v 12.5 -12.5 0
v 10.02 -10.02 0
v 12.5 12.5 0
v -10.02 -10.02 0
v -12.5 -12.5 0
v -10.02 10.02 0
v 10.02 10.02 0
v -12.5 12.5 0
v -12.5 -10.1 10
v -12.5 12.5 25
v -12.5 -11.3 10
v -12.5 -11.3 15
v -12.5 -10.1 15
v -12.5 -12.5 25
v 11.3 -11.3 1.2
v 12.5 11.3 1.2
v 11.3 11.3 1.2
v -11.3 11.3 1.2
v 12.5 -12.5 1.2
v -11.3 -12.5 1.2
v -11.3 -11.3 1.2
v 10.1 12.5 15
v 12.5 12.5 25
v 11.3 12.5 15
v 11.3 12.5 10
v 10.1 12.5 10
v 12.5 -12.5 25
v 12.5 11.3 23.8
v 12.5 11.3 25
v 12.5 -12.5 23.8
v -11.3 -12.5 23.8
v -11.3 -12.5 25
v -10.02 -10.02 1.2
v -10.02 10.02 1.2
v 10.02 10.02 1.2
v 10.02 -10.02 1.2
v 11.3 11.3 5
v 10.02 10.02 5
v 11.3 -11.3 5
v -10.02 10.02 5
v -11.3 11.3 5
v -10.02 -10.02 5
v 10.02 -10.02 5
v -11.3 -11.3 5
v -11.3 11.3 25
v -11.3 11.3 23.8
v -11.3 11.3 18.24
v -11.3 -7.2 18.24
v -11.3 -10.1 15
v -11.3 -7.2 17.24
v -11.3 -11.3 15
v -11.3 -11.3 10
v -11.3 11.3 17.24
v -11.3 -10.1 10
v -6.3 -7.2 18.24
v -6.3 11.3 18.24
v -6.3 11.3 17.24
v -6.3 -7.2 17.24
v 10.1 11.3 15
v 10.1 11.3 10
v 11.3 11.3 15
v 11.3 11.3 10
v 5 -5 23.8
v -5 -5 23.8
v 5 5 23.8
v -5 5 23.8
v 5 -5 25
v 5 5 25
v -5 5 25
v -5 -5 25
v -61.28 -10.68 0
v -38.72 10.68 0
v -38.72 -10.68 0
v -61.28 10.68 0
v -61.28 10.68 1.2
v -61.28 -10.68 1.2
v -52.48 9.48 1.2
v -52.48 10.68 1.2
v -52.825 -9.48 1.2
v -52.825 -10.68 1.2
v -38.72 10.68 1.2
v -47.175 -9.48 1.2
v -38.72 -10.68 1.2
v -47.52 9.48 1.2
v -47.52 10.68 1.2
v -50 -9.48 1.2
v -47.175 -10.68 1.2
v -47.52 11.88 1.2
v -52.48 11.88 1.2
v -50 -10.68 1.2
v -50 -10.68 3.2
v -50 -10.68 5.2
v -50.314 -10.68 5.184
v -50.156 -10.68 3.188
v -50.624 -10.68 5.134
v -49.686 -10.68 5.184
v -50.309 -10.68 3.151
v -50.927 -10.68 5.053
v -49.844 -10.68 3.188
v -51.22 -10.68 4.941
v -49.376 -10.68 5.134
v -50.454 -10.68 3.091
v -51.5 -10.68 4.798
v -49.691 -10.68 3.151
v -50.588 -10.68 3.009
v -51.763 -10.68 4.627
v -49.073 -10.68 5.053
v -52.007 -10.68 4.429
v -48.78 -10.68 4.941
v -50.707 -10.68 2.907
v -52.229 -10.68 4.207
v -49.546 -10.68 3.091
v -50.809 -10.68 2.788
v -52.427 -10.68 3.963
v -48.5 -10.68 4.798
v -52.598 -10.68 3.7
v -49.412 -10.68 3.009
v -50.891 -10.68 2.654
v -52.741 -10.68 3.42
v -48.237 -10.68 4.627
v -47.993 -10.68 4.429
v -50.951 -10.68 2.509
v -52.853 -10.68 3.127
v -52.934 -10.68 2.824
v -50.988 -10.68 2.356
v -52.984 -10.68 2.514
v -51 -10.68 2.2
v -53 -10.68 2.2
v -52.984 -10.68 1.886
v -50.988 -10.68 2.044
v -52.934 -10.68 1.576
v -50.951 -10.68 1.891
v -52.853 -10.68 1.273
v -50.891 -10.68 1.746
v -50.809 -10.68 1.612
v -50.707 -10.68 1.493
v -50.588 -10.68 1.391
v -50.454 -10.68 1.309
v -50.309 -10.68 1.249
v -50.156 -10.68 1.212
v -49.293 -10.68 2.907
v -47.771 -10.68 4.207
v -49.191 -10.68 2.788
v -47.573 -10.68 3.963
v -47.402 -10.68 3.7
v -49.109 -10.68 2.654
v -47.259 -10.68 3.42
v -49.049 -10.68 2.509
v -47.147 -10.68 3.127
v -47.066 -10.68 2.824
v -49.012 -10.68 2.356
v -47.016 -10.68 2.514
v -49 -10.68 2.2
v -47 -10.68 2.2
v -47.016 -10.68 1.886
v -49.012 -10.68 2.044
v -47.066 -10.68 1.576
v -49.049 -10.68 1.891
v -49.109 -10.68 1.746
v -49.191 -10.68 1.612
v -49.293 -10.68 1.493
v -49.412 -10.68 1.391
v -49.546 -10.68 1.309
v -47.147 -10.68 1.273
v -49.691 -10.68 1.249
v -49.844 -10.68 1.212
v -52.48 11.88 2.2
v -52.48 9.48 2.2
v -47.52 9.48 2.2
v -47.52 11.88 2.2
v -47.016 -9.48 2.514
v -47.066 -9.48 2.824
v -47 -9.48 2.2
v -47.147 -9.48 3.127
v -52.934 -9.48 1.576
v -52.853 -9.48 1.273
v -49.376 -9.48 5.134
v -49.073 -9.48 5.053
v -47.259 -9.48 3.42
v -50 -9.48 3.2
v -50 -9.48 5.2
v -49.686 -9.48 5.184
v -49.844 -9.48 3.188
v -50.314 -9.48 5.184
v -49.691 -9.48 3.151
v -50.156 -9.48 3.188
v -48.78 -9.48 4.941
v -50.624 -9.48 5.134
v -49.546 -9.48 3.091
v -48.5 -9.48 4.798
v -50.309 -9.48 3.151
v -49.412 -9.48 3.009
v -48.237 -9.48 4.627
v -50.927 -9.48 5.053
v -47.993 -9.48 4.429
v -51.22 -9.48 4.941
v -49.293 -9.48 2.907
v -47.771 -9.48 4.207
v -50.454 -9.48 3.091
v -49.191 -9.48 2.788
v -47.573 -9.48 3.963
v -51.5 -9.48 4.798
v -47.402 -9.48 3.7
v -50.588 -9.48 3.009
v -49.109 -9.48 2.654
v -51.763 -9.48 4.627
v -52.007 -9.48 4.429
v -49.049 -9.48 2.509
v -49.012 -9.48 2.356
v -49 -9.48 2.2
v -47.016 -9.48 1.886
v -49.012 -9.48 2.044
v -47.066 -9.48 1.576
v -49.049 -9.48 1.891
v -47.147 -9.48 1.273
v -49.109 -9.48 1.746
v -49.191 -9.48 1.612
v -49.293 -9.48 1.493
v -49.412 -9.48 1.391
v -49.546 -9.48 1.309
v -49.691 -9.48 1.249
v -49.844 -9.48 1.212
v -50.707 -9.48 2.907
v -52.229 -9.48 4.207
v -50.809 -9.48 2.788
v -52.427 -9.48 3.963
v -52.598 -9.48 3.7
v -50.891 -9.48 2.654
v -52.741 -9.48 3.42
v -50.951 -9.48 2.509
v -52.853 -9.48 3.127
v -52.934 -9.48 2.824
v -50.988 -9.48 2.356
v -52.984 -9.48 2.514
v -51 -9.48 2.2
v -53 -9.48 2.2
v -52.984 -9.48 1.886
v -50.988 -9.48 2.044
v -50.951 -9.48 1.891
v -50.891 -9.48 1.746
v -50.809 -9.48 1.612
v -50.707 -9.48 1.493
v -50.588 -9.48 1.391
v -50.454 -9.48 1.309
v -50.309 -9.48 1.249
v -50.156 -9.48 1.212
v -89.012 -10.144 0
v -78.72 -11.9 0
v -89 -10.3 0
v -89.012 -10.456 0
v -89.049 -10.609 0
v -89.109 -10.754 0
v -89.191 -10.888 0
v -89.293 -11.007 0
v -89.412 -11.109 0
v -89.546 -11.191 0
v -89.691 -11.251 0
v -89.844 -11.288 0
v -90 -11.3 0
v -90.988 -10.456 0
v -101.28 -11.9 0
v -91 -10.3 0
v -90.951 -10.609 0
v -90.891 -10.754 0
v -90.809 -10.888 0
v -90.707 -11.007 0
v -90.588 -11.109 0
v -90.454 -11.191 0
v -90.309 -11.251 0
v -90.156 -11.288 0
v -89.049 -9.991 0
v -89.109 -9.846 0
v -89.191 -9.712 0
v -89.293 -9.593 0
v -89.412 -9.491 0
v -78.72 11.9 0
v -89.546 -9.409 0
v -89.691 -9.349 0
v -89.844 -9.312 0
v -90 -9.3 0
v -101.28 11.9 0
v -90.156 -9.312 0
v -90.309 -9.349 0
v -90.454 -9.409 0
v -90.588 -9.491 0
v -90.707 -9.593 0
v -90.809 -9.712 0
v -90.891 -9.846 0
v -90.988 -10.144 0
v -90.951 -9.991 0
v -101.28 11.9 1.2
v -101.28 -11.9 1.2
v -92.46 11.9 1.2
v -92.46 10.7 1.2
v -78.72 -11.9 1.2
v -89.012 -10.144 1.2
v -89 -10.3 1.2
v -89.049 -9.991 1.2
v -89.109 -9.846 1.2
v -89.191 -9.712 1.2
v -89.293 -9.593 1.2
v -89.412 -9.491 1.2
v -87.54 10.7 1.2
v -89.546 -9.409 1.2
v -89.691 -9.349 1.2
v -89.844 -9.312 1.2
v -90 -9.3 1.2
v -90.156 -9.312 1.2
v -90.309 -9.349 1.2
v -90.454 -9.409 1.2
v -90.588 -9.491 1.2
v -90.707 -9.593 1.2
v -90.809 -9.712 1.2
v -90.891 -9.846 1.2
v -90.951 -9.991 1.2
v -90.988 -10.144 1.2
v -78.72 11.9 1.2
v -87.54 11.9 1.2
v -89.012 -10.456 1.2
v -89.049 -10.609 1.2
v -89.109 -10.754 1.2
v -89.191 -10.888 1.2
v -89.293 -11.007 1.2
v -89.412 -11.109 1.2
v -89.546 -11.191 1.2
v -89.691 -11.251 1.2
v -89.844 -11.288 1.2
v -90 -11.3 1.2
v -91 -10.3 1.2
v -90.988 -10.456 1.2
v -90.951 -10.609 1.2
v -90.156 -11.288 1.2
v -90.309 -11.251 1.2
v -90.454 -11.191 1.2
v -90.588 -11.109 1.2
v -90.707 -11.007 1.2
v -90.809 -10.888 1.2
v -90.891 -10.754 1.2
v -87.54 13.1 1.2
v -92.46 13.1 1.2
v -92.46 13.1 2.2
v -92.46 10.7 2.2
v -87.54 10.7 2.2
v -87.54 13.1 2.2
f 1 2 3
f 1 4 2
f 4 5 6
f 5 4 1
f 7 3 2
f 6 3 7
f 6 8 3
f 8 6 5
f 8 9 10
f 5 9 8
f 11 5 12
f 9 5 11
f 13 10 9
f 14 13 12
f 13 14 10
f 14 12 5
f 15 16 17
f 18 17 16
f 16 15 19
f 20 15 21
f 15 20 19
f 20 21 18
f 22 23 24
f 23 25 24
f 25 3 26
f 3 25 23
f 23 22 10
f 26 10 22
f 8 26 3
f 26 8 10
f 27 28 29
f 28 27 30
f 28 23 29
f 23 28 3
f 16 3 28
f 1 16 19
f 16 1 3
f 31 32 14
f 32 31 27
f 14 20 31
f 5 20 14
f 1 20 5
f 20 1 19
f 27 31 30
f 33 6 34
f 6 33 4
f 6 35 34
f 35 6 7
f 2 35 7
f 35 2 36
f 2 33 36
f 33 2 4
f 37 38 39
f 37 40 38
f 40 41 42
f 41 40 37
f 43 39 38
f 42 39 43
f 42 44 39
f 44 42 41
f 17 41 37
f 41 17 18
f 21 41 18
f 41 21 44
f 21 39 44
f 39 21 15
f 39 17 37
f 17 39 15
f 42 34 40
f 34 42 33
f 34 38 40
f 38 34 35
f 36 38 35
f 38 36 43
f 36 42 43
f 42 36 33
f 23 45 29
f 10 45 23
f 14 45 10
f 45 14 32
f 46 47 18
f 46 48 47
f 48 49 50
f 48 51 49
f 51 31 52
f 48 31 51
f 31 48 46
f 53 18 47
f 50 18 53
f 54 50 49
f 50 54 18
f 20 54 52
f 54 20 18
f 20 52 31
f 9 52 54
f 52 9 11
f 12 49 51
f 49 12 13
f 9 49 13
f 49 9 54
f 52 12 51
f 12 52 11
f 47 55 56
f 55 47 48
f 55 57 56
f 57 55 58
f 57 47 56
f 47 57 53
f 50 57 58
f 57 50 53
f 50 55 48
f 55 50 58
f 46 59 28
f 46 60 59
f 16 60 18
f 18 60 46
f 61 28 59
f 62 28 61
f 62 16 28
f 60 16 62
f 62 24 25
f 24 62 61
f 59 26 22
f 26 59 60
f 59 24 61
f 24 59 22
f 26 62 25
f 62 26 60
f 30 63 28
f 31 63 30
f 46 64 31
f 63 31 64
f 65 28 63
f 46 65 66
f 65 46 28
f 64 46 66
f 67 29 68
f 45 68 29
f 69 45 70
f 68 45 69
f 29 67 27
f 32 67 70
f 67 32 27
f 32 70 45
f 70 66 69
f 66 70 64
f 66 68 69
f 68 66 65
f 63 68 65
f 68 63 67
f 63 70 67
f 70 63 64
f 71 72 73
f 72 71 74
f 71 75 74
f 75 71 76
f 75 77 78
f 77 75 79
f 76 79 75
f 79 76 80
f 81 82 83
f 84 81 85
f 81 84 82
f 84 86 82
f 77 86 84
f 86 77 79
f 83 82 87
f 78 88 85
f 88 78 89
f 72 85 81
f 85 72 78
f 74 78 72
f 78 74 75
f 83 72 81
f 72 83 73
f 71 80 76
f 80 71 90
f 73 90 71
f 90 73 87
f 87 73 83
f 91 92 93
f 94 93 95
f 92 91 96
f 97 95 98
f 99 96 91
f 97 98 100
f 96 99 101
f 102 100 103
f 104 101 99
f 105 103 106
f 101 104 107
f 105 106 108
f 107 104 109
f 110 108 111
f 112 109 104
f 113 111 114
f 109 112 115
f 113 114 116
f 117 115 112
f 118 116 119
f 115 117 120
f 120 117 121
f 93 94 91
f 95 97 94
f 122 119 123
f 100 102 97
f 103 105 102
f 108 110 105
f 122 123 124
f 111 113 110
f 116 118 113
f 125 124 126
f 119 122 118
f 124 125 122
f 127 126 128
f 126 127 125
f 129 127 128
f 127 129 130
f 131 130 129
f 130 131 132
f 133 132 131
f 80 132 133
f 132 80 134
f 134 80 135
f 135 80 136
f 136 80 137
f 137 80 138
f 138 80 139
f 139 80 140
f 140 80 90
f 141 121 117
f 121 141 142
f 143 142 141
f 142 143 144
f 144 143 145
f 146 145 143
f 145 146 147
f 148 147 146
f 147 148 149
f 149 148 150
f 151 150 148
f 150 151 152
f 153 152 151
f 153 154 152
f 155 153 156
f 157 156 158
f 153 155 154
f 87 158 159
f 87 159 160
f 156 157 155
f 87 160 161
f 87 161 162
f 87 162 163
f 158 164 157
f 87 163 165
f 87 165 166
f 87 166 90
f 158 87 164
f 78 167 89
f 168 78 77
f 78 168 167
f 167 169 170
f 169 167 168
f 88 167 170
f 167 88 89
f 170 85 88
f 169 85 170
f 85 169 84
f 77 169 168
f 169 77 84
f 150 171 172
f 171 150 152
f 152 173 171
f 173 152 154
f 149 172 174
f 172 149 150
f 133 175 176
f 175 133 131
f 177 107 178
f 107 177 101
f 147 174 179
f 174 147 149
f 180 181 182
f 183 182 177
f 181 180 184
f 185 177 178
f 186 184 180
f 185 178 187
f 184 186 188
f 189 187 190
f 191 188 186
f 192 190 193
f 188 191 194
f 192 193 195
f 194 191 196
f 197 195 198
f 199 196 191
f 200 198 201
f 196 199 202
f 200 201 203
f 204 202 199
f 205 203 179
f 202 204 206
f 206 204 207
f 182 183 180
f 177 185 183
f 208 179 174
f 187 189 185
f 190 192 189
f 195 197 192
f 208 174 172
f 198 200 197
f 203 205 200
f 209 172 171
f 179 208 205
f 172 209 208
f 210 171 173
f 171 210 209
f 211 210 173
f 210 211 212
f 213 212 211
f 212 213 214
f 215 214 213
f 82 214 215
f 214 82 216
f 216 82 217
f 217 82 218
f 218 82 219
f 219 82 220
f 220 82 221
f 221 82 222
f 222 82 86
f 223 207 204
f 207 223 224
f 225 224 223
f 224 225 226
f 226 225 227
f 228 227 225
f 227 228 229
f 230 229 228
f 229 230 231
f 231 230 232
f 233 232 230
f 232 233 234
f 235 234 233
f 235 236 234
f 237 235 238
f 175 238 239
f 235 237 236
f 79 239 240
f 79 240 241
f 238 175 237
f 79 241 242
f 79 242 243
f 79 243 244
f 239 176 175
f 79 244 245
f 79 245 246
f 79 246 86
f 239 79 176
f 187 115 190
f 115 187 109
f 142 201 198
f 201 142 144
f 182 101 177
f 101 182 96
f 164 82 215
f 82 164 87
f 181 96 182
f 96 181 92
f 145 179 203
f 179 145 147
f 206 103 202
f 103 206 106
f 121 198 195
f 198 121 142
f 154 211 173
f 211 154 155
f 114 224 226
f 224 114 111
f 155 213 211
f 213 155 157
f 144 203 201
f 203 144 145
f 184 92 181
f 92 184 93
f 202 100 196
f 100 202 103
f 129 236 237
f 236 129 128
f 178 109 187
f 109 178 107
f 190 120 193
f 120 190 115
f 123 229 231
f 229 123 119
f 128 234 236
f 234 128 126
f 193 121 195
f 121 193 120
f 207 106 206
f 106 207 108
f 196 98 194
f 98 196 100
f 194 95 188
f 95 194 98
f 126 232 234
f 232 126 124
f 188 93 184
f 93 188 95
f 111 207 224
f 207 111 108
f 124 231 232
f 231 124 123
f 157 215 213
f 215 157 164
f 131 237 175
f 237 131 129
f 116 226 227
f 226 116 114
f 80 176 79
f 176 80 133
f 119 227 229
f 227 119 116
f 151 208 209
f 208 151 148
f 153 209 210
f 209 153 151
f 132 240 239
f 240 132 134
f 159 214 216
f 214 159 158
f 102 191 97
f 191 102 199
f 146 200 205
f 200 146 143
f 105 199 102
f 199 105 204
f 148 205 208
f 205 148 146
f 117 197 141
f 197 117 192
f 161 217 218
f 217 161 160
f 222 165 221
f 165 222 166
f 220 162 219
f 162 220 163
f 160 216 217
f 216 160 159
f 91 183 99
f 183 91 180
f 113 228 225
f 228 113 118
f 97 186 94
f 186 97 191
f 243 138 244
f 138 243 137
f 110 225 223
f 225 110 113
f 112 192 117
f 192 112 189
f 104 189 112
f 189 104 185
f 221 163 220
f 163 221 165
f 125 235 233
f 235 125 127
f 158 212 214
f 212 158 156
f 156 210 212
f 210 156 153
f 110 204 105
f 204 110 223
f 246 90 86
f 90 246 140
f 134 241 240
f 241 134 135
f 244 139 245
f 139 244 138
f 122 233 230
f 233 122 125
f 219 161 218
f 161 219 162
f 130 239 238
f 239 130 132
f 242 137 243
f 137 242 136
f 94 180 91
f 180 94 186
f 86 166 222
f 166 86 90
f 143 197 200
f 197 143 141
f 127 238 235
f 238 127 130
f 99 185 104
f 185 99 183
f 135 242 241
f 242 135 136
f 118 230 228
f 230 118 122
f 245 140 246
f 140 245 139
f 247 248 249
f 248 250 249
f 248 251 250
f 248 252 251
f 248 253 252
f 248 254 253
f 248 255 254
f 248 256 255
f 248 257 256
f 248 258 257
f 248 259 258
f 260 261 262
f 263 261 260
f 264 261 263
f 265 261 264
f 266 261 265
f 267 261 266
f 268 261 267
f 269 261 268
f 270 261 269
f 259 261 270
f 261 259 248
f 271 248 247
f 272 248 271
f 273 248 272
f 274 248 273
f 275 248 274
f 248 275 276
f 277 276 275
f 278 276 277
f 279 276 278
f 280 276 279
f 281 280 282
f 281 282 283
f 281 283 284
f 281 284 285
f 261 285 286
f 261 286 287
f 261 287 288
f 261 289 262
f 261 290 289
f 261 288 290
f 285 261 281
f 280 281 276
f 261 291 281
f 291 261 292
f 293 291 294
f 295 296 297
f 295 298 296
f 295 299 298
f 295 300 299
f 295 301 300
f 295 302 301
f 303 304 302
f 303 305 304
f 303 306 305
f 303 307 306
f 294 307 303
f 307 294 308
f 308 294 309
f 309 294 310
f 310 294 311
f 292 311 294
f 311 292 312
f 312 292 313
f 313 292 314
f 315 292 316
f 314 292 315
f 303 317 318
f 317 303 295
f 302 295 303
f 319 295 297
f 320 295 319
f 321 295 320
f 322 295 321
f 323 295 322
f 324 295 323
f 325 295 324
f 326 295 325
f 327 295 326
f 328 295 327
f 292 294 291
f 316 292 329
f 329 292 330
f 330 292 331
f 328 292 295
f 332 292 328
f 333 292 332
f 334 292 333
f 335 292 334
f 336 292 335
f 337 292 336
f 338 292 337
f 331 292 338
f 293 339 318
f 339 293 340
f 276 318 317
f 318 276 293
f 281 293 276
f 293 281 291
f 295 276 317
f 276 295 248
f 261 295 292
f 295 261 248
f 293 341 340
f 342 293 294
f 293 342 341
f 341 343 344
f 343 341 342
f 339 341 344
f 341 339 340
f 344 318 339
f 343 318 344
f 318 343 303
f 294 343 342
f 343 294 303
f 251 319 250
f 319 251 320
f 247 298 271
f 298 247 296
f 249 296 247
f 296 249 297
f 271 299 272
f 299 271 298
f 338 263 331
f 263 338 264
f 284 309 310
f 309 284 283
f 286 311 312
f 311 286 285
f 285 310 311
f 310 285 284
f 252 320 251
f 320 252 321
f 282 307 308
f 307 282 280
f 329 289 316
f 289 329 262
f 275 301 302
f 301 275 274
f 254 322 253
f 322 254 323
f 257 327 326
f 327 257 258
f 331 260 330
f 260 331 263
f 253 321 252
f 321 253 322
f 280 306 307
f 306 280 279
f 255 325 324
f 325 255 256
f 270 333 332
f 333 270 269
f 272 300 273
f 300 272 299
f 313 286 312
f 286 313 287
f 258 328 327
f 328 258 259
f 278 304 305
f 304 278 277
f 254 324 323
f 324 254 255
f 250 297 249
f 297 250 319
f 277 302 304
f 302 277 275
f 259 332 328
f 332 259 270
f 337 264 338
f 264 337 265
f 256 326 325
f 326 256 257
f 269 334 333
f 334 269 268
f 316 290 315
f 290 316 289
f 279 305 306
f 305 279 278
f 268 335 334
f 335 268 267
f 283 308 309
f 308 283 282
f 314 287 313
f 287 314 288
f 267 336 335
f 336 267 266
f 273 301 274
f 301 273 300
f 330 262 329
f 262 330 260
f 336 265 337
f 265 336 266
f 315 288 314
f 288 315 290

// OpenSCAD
// ============================================================
// 하우징 Peltier v2 조립
// Peltier 면(바닥): 25x25mm, 사각 링(프레임)이 바닥판 위로 3.8mm 돌출, 안쪽은 관통 구멍
// -X쪽 면: Peltier 면의 -X쪽 가장자리에 수직으로 세움 (평면 기준 90도 회전 후 부착), 리브 5mm 돌출
// +Y쪽 면 / +Z쪽 면(윗면): 패턴 없는 평판, 크기/두께는 나머지 두 면과 동일
// ============================================================

// ---------------- Peltier 면 (바닥) ----------------
module peltier_v2_face() {
    face_size = 25;   // 면의 가로/세로 (정사각형)
    housing_t = 1.2;  // 하우징 두께 (사방 테두리)

    frame_w = 1.28;   // 사각 링(프레임) 벽 두께
    sq_size = 20.04;  // 프레임 안쪽 정사각형 (Peltier 안착 공간, 관통 구멍)
    ring_z  = 3.8;    // 사각 링 Z방향 돌출 높이

    inner_size = face_size - 2 * housing_t; // 22.6mm (하우징 안쪽 치수)
    ring_outer = sq_size + 2 * frame_w;     // 22.6mm (하우징 안쪽 치수와 동일해야 함)

    echo("[Peltier_v2] ring_outer check =", ring_outer, " (should be", inner_size, ")");

    // 바닥판 (실제 3D, 두께 1.2mm). 사각 링 안쪽(20.04x20.04)은 관통 구멍.
    color("gray")
        difference() {
            linear_extrude(height = housing_t)
                square([face_size, face_size], center = true);
            translate([0, 0, -0.1])
                linear_extrude(height = housing_t + 0.2)
                    square([sq_size, sq_size], center = true);
        }

    // 사각 링(프레임): 하우징 안쪽 경계에 정확히 맞닿아 있고, 중앙에 20.04x20.04 정사각형
    // 안착 공간이 생김. 바닥판 위로 ring_z만큼 돌출 (높이 미확정, 참고용).
    color("SteelBlue")
        translate([0, 0, housing_t])
            linear_extrude(height = ring_z)
                difference() {
                    square([ring_outer, ring_outer], center = true);
                    square([sq_size, sq_size], center = true);
                }
}

// ---------------- -X쪽 면 (리브 있는 면) ----------------
module peltier_left_v2_face() {
    face_size = 25;   // 면의 가로/세로 (정사각형, Peltier 면과 동일)
    housing_t = 1.2;  // 하우징 두께 (위/아래/좌/우 테두리)

    rib_w   = 1;      // 리브 두께 (X방향)
    rib_len = 18.5;   // 리브 길이 (Y방향)
    rib_z   = 5;      // 리브 Z방향 돌출 높이

    // Y축 음수방향 모서리에서 Y축 양수 방향으로 1.2mm 떨어진 5x1.2mm 관통 구멍
    hole_w = 5;   // X방향
    hole_h = 1.2; // Y방향
    hole_gap = 1.2; // -Y쪽 모서리 - 구멍 사이 거리

    left_margin  = 5.56;  // 안쪽 왼쪽 모서리 - 리브 왼쪽 면 거리
    right_margin = 16.04; // 리브 오른쪽 면 - 안쪽 오른쪽 모서리 거리

    // Y축: 리브 위쪽 끝이 안쪽 위쪽 모서리(위쪽 테두리 안쪽)에 닿음
    y_inner_top    = face_size / 2 - housing_t;  // 안쪽 위쪽 테두리 (11.3)
    y_inner_bottom = -face_size / 2 + housing_t; // 안쪽 아래쪽 테두리 (-11.3)
    rib_bottom     = y_inner_top - rib_len;      // 리브 아래쪽 끝
    gap_bottom_check = rib_bottom - y_inner_bottom; // 4.1mm 이어야 함

    rib_center_y = (y_inner_top + rib_bottom) / 2;
    rib_center_x = -face_size / 2 + housing_t + left_margin + rib_w / 2;
    x_total_check = left_margin + rib_w + right_margin; // 22.6mm 이어야 함

    echo("[PeltierLeft_v2] gap_bottom check =", gap_bottom_check, " (should be 4.1)");
    echo("[PeltierLeft_v2] x_total check =", x_total_check, " (should be", face_size - 2 * housing_t, ")");

    // 바닥판 (실제 3D, 두께 1.2mm). -Y쪽 모서리에서 1.2mm 떨어진 5x1.2mm 관통 구멍.
    color("gray")
        difference() {
            linear_extrude(height = housing_t)
                square([face_size, face_size], center = true);
            translate([-hole_w / 2, -face_size / 2 + hole_gap, -0.1])
                cube([hole_w, hole_h, housing_t + 0.2]);
        }

    // 리브 (실제 3D, 바닥판 위에 Z 깊이 rib_z 추가, 높이 미확정)
    color("SteelBlue")
        translate([0, 0, housing_t])
            linear_extrude(height = rib_z)
                translate([rib_center_x, rib_center_y])
                    square([rib_w, rib_len], center = true);
}

// ---------------- +Y쪽 면 (X축 양수방향 모서리에 구멍) ----------------
// 크기와 두께는 Peltier 면 / -X쪽 면과 동일 (25x25mm, 1.2mm 두께).
module peltier_y_pos_v2_face() {
    face_size = 25;
    housing_t = 1.2;

    // X축 양수방향 모서리에서 X축 음수 방향으로 1.2mm 떨어진 5x1.2mm 관통 구멍
    hole_w = 1.2; // X방향
    hole_h = 5;   // Y방향
    hole_gap = 1.2; // +X쪽 모서리 - 구멍 사이 거리

    color("gray")
        difference() {
            linear_extrude(height = housing_t)
                square([face_size, face_size], center = true);
            translate([face_size / 2 - hole_gap - hole_w, -hole_h / 2, -0.1])
                cube([hole_w, hole_h, housing_t + 0.2]);
        }
}

// ---------------- +Z쪽 면 (윗면, 정가운데 10x10 정사각형 구멍) ----------------
// 크기와 두께는 Peltier 면 / -X쪽 면과 동일 (25x25mm, 1.2mm 두께).
module peltier_top_v2_face() {
    face_size = 25;
    housing_t = 1.2;
    sq_size   = 10; // 정가운데 정사각형 구멍 한 변

    color("gray")
        difference() {
            linear_extrude(height = housing_t)
                square([face_size, face_size], center = true);
            translate([0, 0, -0.1])
                linear_extrude(height = housing_t + 0.2)
                    square([sq_size, sq_size], center = true);
        }
}

// ---------------- housing_peltier_closure1_v2 (별도 부품) ----------------
module housing_peltier_closure1_v2() {
    plate_w = 22.56; // 가로
    plate_h = 21.36; // 세로
    plate_t = 1.2;   // 판재 두께

    // 돌출 직육면체: 가로 4.96mm, 높이(Z) 1.16mm.
    // 세로(Y)는 +Y쪽 가장자리 기준으로 면 위에 1.2mm + 바깥으로 1.2mm = 총 2.4mm
    tab_w        = 4.96; // 가로
    tab_protrude = 1.2;  // 3D 기준 +Y 방향으로 면 바깥으로 튀어나오는 길이
    tab_overlap  = 1.2;  // 면 위에 걸쳐있는 길이 (+Y쪽 가장자리에서 안쪽으로)
    tab_len      = tab_protrude + tab_overlap; // 세로 전체 길이 (2.4mm)
    tab_z        = 1;    // 돌출부가 판재 위로 추가로 튀어나오는 두께(높이)

    // -Y쪽 나사 보스: 구멍은 Y축 방향으로 관통, X는 정중앙(0).
    // 안쪽 구멍 지름 2mm, 둘러싼 두께 2mm -> 바깥지름 6mm. 가장자리에서 안쪽으로 1.2mm.
    boss_screw_d = 2;
    boss_wall_t  = 2;
    boss_d       = boss_screw_d + 2 * boss_wall_t; // 6mm
    boss_len     = 1.2; // -Y 가장자리에서 안쪽(+Y)으로 들어간 길이
    boss_z       = plate_t + boss_d / 2 - 2; // 구멍 중심 기준 Z축 음수 방향으로 2mm 내림

    echo("[PeltierClosure1] tab_w =", tab_w, " tab_len =", tab_len, " tab_z =", tab_z);
    echo("[PeltierClosure1] boss_d =", boss_d, " boss_len =", boss_len);

    difference() {
        union() {
            // 메인 평판
            color("gray")
                linear_extrude(height = plate_t)
                    square([plate_w, plate_h], center = true);

            // 돌출 직육면체 (4.96mm x 2.4mm x 1.16mm). +Y쪽 가장자리를 기준으로
            // 안쪽(면 위)으로 1.2mm, 바깥쪽(3D +Y 방향)으로 1.2mm 걸쳐 있음.
            color("SteelBlue")
                translate([0, plate_h / 2 - tab_overlap + tab_len / 2, plate_t])
                    linear_extrude(height = tab_z)
                        square([tab_w, tab_len], center = true);

            // -Y쪽 나사 보스 (바깥지름 6mm), 가장자리에서 안쪽으로 1.2mm
            color("SteelBlue")
                translate([0, -plate_h / 2 + boss_len, boss_z])
                    rotate([90, 0, 0])
                        cylinder(d = boss_d, h = boss_len, $fn = 60);
        }

        // 나사 구멍 (Y방향 관통, 보스를 지나 여유 있게)
        translate([0, -plate_h / 2 + boss_len + 0.1, boss_z])
            rotate([90, 0, 0])
                cylinder(d = boss_screw_d, h = boss_len + 0.2, $fn = 40);

        // 보스가 판재 아래(z<0)로 튀어나온 부분 제거
        translate([-plate_w, -plate_h, -100])
            cube([plate_w * 2, plate_h * 2, 100]);
    }
}

// ---------------- housing_peltier_closure2_v2 (별도 부품) ----------------
module housing_peltier_closure2_v2() {
    plate_w = 22.56; // 가로
    plate_h = 23.8;  // 세로 (25 -> 1.2mm 감소)
    plate_t = 1.2;   // 판재 두께

    // 돌출 탭: housing_peltier_closure1_v2와 동일한 구조.
    // 가로 4.92mm. 세로(Y)는 +Y쪽 가장자리 기준 면 위에 1.2mm 걸치고(overlap)
    // 바깥으로 1.2mm 튀어나옴(protrude) = 총 2.4mm. 판재 위에 tab_z만큼 돌출.
    tab_w        = 4.92; // 가로 (4.96 -> 4.92)
    tab_protrude = 1.2;  // 3D 기준 +Y 방향으로 면 바깥으로 튀어나오는 길이
    tab_overlap  = 1.2;  // 면 위에 걸쳐있는 길이 (+Y쪽 가장자리에서 안쪽으로)
    tab_len      = tab_protrude + tab_overlap; // 세로 전체 길이 (2.4mm)
    tab_z        = 1;    // 돌출부가 판재 위로 추가로 튀어나오는 두께(높이)

    // 나사 구멍: 정사각형 중심(=판재 중심)에서 Y축 음수 방향으로 10.3mm 떨어진 위치.
    // 보스 없이 Z축 방향(판재를 관통)으로 뚫림.
    screw_d = 2;
    screw_y = -10.3;

    echo("[PeltierClosure2] tab_w =", tab_w, " tab_len =", tab_len, " tab_z =", tab_z);
    echo("[PeltierClosure2] screw_y =", screw_y);

    difference() {
        union() {
            // 메인 평판 (정사각형 구멍 없이 막힘)
            color("gray")
                linear_extrude(height = plate_t)
                    square([plate_w, plate_h], center = true);

            // 윗변 돌출 탭 (실제 3D, 판재 위에 Z 깊이 tab_z 추가), 윗변 바깥쪽으로 튀어나옴.
            color("SteelBlue")
                translate([0, plate_h / 2 - tab_overlap + tab_len / 2, plate_t])
                    linear_extrude(height = tab_z)
                        square([tab_w, tab_len], center = true);
        }

        // 나사 구멍 (Z방향 관통), 정사각형 중심에서 Y축 음수방향 10.3mm
        translate([0, screw_y, -0.1])
            cylinder(d = screw_d, h = plate_t + 0.2, $fn = 40);
    }
}

// ---------------- 조립 ----------------
peltier_v2_face();

// -X쪽 면을 Peltier 면의 -X쪽 가장자리(x=-12.5)에 수직으로 세움.
// 로컬 Y -> world Z, 로컬 Z(리브 돌출) -> world +X
// left_v2_face(housing_erm_v2)와 동일한 부착 방식: 평면 기준 90도 회전 후 부착.
translate([-12.5, 0, 12.5])
    rotate([0, 0, 90])
        rotate([90, 0, 0])
            rotate([0, 0, -90])
                peltier_left_v2_face();

// +Y쪽 면을 Peltier 면의 +Y쪽 가장자리(y=12.5)에 수직으로 세움.
translate([0, 12.5, 12.5])
    rotate([90, 0, 0])
        peltier_y_pos_v2_face();

// +Z쪽 면(윗면)을 Peltier 면 위(z=23.8~25)에 평행하게 덮음.
translate([0, 0, 23.8])
    peltier_top_v2_face();

// closure1/closure2는 조립체에 붙이지 않고 옆으로 떨어뜨려서 배치
translate([-50, 0, 0])
    housing_peltier_closure1_v2();

translate([-90, 0, 0])
    housing_peltier_closure2_v2();
